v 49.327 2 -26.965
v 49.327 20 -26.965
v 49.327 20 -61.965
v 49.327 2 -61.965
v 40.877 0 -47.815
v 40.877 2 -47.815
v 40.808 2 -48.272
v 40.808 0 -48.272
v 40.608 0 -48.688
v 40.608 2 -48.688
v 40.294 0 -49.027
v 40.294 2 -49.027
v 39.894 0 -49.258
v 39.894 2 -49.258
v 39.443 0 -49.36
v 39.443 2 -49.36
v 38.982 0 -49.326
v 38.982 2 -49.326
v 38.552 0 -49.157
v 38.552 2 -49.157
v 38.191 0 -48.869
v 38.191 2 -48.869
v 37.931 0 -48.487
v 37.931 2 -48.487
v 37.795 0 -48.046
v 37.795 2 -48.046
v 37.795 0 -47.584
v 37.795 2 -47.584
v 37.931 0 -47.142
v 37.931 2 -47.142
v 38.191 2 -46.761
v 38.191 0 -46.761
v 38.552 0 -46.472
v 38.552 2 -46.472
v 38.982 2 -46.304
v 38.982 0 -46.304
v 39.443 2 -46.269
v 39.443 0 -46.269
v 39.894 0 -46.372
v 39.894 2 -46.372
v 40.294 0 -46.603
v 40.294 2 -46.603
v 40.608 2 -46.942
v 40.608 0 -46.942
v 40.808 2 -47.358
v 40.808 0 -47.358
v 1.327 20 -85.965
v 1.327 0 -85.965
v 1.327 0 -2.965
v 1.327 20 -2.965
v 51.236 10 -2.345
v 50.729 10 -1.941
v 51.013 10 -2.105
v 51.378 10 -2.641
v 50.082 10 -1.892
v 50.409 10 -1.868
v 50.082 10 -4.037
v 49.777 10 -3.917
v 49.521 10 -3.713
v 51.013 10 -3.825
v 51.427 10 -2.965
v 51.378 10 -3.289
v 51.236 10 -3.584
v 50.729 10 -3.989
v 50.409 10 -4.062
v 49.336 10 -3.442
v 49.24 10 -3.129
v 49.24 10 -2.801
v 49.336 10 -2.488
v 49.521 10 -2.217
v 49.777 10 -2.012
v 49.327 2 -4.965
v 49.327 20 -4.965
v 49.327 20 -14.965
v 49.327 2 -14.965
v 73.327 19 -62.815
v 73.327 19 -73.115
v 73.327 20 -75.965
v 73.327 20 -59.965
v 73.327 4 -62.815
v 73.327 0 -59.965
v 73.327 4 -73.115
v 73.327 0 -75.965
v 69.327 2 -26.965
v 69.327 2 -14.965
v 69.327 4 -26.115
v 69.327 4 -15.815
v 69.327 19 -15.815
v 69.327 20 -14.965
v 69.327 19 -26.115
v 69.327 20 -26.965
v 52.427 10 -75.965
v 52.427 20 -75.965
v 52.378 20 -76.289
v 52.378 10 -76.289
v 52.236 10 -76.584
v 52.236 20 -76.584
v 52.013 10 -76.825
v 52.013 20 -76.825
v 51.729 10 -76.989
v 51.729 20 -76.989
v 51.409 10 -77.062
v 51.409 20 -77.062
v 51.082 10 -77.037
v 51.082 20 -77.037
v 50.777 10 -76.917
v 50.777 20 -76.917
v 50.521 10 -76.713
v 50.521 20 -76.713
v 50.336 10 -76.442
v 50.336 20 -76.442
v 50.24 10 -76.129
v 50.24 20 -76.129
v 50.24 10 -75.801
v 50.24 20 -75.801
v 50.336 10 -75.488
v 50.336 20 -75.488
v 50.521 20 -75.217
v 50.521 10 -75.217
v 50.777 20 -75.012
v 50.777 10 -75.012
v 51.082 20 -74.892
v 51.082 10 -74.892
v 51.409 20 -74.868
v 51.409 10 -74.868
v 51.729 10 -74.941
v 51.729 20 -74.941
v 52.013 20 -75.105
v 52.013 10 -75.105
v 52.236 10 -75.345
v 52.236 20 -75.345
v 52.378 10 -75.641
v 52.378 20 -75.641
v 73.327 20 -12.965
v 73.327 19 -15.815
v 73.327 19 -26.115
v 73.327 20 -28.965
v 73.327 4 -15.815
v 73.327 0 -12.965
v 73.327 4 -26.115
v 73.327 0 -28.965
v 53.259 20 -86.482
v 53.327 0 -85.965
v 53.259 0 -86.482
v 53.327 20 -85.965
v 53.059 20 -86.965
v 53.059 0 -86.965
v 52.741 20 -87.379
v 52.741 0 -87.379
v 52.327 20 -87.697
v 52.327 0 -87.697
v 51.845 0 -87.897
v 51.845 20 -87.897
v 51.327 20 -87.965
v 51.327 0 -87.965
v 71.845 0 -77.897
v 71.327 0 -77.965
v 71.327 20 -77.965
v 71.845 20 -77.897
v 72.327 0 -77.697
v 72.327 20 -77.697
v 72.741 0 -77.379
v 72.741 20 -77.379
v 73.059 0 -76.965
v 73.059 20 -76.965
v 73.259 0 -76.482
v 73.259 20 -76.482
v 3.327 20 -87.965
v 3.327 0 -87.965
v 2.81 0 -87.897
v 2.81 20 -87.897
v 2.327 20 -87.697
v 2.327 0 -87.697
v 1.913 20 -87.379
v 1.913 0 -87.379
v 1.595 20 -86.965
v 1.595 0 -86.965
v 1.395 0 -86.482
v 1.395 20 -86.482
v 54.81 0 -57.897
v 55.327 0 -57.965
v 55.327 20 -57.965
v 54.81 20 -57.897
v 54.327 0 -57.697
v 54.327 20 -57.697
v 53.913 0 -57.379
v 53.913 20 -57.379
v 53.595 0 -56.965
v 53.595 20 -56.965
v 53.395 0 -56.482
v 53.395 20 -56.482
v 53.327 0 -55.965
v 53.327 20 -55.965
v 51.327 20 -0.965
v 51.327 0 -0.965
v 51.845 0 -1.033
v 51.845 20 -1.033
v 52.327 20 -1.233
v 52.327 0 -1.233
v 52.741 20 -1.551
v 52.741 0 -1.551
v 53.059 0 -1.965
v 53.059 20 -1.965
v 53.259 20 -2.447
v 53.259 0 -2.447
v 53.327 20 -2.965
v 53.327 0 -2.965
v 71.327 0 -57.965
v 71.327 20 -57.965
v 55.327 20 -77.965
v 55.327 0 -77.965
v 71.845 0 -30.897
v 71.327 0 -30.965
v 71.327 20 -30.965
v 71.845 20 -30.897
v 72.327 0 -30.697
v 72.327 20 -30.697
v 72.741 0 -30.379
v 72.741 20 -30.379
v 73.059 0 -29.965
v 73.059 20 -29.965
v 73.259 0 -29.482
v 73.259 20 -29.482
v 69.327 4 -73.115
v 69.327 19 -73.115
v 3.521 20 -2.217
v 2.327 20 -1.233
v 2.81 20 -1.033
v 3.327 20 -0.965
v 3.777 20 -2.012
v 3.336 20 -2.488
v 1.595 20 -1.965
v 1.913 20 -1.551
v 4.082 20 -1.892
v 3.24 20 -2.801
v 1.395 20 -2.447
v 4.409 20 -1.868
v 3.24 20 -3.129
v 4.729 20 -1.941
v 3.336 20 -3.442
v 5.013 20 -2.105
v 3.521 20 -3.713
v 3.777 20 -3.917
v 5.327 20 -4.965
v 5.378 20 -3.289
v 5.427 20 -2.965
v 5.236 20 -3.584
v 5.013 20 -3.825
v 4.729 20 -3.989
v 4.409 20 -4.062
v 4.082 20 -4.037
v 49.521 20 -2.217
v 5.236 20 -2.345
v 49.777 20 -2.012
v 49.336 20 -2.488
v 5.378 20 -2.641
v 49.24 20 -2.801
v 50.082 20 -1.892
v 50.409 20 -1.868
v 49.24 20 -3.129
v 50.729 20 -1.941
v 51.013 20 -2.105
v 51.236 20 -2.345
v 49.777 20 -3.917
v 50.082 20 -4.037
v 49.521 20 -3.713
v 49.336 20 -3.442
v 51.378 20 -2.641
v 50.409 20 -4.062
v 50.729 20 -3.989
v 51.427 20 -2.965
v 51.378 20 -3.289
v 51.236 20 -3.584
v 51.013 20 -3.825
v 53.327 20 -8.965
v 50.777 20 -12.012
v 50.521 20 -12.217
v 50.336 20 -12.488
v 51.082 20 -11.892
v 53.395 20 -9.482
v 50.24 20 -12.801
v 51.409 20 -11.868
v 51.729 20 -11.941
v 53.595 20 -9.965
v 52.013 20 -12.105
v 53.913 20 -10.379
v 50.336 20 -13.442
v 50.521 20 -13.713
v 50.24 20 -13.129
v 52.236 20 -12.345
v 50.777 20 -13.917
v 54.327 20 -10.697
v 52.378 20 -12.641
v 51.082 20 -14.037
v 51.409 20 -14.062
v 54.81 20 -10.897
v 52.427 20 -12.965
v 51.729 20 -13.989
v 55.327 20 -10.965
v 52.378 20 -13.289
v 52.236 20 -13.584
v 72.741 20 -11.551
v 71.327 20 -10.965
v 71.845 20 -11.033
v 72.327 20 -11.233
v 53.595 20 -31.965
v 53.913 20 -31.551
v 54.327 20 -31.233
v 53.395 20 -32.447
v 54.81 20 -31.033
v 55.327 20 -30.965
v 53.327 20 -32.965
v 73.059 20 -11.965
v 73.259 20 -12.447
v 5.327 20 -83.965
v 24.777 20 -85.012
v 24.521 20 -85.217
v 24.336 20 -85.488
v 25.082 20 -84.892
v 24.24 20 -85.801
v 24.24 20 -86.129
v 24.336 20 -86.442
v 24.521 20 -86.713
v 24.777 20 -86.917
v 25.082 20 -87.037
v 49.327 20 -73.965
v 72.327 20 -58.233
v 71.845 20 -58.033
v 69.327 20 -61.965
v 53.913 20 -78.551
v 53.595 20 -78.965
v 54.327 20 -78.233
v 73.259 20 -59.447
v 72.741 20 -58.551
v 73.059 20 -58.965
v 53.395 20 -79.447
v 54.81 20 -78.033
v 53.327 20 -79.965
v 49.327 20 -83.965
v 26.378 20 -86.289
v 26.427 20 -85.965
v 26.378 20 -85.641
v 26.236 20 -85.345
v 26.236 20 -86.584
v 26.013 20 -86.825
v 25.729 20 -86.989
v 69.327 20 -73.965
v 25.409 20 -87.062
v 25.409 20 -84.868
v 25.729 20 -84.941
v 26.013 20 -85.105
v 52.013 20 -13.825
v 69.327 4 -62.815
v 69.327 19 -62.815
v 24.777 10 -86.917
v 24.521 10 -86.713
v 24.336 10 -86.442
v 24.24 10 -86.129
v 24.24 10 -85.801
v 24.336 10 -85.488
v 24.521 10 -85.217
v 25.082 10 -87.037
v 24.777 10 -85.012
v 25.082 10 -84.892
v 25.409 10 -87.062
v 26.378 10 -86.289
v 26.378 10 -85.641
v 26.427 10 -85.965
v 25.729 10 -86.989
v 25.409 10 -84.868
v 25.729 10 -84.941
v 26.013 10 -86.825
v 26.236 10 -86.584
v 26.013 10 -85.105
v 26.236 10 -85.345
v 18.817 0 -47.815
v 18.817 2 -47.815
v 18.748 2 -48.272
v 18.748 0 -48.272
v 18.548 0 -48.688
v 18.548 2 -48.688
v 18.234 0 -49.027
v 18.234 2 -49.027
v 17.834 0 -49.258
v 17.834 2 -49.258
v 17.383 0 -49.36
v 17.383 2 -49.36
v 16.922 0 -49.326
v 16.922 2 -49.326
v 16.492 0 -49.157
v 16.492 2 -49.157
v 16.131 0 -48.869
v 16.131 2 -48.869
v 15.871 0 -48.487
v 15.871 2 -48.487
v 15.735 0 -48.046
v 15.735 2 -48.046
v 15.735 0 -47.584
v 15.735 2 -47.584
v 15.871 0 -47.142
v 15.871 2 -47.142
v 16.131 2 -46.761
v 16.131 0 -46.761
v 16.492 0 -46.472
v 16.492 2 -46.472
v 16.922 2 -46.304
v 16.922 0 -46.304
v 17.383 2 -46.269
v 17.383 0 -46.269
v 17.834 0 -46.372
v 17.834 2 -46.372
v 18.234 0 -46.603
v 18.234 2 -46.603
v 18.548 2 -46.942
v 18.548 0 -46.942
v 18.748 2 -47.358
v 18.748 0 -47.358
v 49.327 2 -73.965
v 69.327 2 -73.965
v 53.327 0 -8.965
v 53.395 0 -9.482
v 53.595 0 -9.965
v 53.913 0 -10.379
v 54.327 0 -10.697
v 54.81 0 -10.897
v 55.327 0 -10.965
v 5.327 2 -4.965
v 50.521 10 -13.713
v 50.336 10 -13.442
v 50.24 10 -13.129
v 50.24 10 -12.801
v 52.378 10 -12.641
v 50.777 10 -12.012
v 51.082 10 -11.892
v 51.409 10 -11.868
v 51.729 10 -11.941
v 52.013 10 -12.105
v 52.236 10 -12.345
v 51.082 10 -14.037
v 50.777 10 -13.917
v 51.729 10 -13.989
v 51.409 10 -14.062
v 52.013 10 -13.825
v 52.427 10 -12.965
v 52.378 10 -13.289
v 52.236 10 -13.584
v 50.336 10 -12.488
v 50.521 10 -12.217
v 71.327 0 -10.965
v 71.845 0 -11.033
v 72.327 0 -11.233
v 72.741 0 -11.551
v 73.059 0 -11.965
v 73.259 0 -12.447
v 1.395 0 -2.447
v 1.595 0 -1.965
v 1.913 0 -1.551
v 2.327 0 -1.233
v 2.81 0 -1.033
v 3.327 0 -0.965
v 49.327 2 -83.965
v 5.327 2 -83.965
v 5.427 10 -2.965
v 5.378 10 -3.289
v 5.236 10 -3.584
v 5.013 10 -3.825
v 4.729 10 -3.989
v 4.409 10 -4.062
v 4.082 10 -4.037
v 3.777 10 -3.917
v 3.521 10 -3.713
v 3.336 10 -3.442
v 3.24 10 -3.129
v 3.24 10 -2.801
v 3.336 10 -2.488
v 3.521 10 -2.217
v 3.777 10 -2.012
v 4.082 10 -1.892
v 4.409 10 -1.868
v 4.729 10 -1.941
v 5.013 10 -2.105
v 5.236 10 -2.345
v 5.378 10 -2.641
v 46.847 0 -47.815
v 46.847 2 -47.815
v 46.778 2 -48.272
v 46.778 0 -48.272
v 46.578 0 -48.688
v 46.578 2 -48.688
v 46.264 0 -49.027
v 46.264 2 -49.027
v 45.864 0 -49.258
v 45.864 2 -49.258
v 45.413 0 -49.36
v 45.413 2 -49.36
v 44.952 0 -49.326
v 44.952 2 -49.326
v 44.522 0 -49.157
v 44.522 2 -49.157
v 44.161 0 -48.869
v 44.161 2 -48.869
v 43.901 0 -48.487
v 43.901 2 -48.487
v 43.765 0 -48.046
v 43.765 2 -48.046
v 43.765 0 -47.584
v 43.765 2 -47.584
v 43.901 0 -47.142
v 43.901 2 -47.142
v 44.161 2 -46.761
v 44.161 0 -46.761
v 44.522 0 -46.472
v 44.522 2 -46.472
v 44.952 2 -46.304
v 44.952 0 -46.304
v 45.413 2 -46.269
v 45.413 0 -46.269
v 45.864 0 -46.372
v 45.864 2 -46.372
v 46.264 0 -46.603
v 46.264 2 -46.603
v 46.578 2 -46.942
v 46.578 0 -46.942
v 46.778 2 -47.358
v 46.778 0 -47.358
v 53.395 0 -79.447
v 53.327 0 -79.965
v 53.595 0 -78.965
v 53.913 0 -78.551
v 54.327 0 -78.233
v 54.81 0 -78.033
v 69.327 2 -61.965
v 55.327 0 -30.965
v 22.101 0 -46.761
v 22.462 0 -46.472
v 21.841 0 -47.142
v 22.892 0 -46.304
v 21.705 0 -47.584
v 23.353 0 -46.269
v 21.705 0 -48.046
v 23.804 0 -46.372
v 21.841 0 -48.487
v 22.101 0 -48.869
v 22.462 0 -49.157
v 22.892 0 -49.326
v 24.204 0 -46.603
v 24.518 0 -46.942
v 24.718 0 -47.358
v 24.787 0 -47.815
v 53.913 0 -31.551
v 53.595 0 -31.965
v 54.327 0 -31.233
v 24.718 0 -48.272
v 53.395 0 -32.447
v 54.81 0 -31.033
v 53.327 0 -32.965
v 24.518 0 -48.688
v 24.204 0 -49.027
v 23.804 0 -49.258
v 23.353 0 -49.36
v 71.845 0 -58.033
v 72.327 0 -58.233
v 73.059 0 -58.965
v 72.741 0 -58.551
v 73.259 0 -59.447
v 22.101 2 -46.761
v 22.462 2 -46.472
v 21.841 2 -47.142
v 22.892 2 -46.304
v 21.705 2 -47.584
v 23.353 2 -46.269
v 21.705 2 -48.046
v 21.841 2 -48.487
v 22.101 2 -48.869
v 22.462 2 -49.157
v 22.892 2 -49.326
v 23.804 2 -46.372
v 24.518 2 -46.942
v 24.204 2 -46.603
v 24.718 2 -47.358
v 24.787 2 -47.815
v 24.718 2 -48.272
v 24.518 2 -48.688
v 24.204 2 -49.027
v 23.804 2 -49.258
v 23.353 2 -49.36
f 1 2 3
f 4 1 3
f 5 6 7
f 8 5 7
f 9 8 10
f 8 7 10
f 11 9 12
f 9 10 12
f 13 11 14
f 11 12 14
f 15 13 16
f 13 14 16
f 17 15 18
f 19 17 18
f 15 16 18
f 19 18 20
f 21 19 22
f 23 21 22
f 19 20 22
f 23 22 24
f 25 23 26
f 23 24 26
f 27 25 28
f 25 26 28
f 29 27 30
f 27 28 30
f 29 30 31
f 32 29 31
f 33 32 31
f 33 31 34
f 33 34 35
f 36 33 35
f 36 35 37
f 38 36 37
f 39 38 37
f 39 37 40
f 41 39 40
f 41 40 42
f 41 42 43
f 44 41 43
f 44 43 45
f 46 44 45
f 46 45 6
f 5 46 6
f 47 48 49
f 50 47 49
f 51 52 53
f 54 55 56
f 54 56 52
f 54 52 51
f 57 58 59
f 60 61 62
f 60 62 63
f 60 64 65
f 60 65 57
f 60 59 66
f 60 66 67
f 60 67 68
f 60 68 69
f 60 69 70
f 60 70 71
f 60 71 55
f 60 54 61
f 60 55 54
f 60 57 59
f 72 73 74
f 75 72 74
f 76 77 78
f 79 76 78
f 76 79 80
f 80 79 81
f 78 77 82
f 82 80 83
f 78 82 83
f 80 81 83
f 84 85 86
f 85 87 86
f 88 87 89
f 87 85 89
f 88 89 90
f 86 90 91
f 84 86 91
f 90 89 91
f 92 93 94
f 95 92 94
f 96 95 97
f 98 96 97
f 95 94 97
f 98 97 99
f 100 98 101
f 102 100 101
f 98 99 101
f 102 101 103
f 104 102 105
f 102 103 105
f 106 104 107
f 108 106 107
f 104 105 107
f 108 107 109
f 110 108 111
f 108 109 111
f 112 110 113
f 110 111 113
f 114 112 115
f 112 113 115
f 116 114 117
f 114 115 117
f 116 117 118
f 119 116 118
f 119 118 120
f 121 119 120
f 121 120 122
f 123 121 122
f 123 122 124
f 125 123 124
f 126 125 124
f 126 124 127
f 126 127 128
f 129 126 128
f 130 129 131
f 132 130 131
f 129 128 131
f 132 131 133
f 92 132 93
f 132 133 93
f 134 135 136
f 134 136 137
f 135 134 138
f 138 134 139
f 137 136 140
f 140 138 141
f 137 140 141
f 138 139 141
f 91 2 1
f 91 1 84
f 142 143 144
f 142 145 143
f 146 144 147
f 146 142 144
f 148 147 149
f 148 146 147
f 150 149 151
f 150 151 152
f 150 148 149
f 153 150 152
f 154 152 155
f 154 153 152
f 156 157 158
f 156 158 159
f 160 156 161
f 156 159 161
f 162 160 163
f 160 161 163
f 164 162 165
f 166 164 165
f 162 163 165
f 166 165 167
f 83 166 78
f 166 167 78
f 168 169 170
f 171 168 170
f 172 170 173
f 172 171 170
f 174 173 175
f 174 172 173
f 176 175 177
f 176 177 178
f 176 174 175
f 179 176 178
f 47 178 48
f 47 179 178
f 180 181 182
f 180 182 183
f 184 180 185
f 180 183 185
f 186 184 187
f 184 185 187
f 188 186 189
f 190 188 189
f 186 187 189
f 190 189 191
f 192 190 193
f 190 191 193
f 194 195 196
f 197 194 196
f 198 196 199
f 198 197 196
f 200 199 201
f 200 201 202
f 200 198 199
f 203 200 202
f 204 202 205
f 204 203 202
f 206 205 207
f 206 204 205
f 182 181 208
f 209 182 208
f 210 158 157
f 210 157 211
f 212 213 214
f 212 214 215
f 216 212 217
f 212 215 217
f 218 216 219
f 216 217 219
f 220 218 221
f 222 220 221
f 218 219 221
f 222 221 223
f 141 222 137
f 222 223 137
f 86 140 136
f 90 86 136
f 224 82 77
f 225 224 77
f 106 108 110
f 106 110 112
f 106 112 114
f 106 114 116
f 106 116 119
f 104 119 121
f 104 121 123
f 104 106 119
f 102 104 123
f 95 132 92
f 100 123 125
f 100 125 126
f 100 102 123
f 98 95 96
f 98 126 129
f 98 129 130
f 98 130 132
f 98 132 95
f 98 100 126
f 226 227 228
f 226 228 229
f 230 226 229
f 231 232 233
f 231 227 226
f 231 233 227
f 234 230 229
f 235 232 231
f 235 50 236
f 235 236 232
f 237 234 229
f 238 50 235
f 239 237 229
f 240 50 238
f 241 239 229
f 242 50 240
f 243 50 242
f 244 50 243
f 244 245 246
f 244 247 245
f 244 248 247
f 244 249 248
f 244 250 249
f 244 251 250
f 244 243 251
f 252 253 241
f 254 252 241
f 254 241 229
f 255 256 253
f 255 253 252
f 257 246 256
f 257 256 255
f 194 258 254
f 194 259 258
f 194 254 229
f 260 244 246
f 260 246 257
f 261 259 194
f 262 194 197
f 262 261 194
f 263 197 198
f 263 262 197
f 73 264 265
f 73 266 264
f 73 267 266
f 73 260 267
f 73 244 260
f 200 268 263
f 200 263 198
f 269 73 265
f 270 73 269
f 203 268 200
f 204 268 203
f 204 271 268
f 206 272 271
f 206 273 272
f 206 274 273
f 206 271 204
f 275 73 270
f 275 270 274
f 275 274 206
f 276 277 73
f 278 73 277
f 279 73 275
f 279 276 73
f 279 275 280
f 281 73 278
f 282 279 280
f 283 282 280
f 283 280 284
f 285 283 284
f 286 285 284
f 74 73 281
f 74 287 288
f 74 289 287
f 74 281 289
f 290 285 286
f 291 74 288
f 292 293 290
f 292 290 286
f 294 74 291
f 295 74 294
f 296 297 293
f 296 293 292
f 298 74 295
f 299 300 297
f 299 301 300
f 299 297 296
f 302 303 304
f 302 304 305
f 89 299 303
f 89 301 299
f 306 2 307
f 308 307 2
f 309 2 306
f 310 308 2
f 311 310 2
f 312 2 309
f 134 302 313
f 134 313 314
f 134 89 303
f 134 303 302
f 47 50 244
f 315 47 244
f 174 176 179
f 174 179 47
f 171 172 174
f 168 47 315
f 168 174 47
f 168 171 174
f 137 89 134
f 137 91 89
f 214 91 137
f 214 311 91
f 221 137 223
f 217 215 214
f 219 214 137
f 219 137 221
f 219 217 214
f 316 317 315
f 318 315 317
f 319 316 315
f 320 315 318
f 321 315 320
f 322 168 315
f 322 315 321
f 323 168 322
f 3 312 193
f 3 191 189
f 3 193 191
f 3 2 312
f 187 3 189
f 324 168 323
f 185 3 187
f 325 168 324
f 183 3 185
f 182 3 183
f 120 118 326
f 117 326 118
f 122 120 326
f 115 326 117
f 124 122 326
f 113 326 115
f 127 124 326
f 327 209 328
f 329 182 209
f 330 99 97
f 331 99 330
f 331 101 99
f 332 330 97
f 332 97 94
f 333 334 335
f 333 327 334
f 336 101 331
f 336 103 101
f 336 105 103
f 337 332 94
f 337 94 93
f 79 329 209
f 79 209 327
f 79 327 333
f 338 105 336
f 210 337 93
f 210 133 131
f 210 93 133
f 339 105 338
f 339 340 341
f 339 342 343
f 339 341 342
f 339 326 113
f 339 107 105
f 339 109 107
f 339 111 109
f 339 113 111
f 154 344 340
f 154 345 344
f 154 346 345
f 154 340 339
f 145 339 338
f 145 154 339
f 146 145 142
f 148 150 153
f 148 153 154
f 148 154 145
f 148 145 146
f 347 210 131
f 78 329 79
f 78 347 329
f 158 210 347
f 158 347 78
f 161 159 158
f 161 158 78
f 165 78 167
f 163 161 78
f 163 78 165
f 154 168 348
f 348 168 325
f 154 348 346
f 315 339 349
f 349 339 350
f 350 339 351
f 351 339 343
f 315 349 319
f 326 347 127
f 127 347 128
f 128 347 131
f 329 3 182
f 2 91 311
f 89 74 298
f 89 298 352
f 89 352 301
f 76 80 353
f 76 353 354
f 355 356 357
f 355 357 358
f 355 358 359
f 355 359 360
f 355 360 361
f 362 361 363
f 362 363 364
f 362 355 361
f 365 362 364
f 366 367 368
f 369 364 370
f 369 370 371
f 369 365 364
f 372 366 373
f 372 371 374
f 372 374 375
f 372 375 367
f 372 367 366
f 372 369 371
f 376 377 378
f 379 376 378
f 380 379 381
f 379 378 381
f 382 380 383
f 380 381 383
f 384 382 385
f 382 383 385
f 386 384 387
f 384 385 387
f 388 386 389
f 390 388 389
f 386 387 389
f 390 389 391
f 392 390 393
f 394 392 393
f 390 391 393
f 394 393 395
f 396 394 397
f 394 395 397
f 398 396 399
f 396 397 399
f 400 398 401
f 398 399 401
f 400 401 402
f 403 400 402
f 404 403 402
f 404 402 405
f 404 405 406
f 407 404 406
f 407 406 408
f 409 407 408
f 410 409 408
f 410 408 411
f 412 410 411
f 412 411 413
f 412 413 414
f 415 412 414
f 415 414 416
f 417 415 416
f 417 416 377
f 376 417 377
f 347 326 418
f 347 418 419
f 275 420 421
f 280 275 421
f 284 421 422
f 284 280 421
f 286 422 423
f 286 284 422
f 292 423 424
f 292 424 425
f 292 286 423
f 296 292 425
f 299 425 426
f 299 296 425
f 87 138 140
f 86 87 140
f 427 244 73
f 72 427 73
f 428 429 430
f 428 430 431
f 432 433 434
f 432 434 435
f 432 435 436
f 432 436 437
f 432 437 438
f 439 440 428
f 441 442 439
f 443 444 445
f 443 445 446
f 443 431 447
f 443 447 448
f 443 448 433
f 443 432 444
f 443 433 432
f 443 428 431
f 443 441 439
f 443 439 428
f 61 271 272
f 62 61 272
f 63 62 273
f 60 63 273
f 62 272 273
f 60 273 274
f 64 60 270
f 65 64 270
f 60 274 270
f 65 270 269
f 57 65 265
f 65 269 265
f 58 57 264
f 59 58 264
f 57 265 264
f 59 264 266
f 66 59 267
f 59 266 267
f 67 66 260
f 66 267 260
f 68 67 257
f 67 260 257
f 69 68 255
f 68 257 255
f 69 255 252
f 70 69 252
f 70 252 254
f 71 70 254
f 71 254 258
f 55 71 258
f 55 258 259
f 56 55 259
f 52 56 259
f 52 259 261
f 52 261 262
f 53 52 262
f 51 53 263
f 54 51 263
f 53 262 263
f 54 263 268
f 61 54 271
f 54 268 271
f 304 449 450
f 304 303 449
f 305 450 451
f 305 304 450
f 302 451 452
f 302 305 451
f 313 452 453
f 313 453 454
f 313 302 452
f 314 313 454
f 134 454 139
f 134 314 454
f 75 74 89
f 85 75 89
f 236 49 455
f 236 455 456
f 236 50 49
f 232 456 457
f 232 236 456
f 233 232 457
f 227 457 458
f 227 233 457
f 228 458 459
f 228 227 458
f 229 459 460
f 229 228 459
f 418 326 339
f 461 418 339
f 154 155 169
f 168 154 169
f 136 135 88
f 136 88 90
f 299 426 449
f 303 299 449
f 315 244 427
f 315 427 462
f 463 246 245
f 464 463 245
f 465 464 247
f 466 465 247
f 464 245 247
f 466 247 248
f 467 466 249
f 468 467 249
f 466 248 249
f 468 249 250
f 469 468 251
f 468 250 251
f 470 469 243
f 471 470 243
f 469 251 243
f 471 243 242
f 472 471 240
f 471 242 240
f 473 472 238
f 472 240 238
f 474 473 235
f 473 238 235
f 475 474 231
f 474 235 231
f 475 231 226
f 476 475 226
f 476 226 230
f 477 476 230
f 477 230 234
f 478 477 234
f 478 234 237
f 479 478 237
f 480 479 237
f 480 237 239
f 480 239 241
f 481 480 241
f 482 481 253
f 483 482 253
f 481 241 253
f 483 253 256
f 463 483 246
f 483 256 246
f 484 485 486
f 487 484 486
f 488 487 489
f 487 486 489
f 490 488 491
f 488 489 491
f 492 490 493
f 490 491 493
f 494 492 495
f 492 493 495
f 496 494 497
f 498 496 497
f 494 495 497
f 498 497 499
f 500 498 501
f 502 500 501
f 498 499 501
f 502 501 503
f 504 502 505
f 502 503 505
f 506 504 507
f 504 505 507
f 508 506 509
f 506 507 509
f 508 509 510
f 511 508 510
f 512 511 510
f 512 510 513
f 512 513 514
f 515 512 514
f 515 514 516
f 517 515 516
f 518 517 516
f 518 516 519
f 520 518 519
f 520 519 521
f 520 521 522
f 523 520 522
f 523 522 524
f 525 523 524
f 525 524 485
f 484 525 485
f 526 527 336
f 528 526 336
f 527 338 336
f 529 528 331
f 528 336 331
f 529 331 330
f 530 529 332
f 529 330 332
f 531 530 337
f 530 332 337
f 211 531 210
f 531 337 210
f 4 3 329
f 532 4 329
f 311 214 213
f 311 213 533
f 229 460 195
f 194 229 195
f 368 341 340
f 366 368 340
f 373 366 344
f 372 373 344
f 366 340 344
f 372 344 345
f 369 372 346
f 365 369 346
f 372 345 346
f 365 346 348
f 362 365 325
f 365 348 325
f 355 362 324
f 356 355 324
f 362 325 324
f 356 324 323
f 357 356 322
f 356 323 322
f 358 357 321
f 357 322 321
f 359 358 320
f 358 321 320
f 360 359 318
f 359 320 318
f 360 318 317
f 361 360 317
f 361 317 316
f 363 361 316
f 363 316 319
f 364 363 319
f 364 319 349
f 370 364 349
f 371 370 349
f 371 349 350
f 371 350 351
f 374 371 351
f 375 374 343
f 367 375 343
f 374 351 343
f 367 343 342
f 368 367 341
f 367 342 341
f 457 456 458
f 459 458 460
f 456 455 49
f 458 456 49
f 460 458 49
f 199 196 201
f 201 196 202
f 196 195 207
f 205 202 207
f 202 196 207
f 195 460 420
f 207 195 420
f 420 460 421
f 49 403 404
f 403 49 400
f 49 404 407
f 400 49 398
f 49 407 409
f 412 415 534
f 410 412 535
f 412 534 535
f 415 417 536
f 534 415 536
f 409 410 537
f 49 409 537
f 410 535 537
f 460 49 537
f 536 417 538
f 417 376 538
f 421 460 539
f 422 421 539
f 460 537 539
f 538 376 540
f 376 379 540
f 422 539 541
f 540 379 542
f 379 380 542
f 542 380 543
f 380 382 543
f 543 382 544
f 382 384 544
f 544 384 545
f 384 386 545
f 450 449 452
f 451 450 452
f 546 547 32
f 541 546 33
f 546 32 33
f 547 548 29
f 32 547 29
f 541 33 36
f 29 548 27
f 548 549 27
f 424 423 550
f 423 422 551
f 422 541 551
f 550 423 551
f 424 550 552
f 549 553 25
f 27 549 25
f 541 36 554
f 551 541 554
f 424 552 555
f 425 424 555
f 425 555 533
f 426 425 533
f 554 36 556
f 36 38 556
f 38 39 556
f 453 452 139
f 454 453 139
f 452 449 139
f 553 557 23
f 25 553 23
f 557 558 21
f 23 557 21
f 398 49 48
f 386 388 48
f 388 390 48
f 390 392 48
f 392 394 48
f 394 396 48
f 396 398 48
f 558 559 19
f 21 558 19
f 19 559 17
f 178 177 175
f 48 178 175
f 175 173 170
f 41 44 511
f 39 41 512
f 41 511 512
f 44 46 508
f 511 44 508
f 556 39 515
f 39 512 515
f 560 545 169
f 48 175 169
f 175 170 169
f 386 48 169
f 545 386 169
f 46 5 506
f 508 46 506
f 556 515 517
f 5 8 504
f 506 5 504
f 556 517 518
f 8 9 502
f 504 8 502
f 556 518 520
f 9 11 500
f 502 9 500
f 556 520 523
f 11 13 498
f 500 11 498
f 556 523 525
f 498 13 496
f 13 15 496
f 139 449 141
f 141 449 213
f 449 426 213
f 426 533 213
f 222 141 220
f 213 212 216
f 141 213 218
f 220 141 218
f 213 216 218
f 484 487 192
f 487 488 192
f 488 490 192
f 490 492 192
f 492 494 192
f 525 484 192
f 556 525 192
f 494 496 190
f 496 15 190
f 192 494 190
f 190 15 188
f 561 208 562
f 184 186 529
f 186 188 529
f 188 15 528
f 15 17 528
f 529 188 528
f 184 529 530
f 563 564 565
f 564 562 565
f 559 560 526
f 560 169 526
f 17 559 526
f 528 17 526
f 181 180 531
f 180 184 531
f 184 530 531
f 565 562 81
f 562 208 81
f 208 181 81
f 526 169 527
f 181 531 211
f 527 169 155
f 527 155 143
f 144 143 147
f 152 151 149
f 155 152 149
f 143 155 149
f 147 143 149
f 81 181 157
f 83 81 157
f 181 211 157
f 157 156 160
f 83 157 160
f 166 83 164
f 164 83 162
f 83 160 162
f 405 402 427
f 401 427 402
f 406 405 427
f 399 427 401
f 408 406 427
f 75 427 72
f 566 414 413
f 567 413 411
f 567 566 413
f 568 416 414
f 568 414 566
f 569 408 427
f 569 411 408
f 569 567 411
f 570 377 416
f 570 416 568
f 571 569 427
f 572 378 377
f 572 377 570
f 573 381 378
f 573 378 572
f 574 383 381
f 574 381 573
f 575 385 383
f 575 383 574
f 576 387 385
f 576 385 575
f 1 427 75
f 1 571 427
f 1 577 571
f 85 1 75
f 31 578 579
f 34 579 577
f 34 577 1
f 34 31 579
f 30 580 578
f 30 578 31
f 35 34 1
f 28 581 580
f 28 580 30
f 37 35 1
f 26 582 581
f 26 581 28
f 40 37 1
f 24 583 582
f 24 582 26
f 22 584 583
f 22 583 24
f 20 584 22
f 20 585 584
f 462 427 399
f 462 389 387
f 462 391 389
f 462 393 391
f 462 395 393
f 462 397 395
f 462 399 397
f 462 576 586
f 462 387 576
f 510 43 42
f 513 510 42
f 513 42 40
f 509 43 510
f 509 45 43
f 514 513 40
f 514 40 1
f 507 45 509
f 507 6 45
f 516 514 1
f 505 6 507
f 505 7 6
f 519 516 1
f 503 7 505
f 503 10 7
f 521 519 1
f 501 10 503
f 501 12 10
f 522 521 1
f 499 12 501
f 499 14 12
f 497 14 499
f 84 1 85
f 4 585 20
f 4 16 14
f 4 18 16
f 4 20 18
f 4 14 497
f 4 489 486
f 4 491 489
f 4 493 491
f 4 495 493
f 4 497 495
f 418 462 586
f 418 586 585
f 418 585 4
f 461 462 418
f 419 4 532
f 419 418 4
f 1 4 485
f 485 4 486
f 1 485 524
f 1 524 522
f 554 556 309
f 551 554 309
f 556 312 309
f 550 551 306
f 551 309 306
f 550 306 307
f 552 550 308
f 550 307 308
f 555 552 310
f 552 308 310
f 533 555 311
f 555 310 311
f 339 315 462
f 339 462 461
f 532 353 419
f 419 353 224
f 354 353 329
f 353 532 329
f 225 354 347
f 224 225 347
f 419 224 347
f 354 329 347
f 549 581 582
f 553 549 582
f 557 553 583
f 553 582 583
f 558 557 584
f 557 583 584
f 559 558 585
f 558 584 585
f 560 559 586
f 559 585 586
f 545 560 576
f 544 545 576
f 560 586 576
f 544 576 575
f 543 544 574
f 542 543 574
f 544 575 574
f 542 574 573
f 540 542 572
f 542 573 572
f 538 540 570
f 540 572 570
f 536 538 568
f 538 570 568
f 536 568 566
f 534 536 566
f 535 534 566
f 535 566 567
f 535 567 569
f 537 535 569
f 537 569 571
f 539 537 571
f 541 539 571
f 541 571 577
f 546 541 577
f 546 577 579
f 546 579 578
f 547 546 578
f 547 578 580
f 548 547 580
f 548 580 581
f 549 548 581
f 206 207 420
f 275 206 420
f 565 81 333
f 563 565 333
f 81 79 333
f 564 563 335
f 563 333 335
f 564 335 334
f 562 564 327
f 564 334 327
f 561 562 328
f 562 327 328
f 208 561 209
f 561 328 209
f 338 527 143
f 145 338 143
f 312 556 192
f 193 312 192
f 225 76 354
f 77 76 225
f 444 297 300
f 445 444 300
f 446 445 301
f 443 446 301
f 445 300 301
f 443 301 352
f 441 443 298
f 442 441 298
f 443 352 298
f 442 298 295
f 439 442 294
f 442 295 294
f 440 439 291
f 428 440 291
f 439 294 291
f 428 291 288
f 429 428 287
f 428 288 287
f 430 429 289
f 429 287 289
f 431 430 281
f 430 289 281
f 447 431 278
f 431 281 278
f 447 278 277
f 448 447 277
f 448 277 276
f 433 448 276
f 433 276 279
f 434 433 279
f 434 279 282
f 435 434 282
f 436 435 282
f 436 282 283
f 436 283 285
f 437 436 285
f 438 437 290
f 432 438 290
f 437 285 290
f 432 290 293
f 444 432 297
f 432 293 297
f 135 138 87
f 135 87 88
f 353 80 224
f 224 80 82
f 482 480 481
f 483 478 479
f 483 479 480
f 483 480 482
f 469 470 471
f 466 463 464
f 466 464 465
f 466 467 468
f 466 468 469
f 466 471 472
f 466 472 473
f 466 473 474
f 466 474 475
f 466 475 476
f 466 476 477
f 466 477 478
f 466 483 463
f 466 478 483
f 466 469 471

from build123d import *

# Parameters (mm, degrees)
BOSS_EXTRUDE1_DEPTH = 20
SKETCH2_W           = 44
SKETCH2_H           = 79
CUT_EXTRUDE1_DEPTH  = 18
SKETCH3_W           = 20
SKETCH3_H           = 12
CUT_EXTRUDE2_DEPTH  = 18
SKETCH4_R           = 1.1
CUT_EXTRUDE3_DEPTH  = 10
SKETCH5_R           = 1.1
CUT_EXTRUDE4_DEPTH  = 10
SKETCH6_W           = 10.3
SKETCH6_H           = 15
CUT_EXTRUDE5_DEPTH  = 6
SKETCH7_R           = 1.55
CUT_EXTRUDE6_DEPTH  = 6
FILLET1_R           = 2


with BuildPart() as part:
    # Sketch1 → Boss-Extrude1 (new body)
    with BuildSketch(Plane(origin=(0, 0, 0), x_dir=(1, 0, 0), z_dir=(0, 1, 0))):
        Polygon((53.327223789, 77.96478334), (53.327223789, 87.96478334), (1.327223789, 87.96478334), (1.327223789, 0.96478334), (53.327223789, 0.96478334), (53.327223789, 10.96478334), (73.327223789, 10.96478334), (73.327223789, 30.96478334), (53.327223789, 30.96478334), (53.327223789, 57.96478334), (73.327223789, 57.96478334), (73.327223789, 77.96478334), align=None)
    extrude(amount=BOSS_EXTRUDE1_DEPTH)

    # Sketch2 → Cut-Extrude1 (cut)
    with BuildSketch(Plane(origin=(0, 20, 0), x_dir=(1, 0, 0), z_dir=(0, 1, 0))):
        with Locations((27.327223789, 44.46478334)):
            Rectangle(SKETCH2_W, SKETCH2_H)
    extrude(amount=-CUT_EXTRUDE1_DEPTH, mode=Mode.SUBTRACT)

    # Sketch3 → Cut-Extrude2 (cut)
    with BuildSketch(Plane(origin=(0, 20, 0), x_dir=(1, 0, 0), z_dir=(0, 1, 0))):
        with Locations((59.327223789, 67.96478334)):
            Rectangle(SKETCH3_W, SKETCH3_H)
        with Locations((59.327223789, 20.96478334)):
            Rectangle(SKETCH3_W, SKETCH3_H)
    extrude(amount=-CUT_EXTRUDE2_DEPTH, mode=Mode.SUBTRACT)

    # Sketch4 → Cut-Extrude3 (cut)
    with BuildSketch(Plane(origin=(0, 20, 0), x_dir=(1, 0, 0), z_dir=(0, 1, 0))):
        with Locations((4.327223789, 2.96478334)):
            Circle(SKETCH4_R)
        with Locations((50.327223789, 2.96478334)):
            Circle(SKETCH4_R)
        with Locations((25.327223789, 85.96478334)):
            Circle(SKETCH4_R)
    extrude(amount=-CUT_EXTRUDE3_DEPTH, mode=Mode.SUBTRACT)

    # Sketch5 → Cut-Extrude4 (cut)
    with BuildSketch(Plane(origin=(0, 20, 0), x_dir=(1, 0, 0), z_dir=(0, 1, 0))):
        with Locations((51.327223789, 12.96478334)):
            Circle(SKETCH5_R)
        with Locations((51.327223789, 75.96478334)):
            Circle(SKETCH5_R)
    extrude(amount=-CUT_EXTRUDE4_DEPTH, mode=Mode.SUBTRACT)

    # Sketch6 → Cut-Extrude5 (cut)
    with BuildSketch(Plane(origin=(73.327223789, 0, 0), x_dir=(0, 0, -1), z_dir=(1, 0, 0))):
        with Locations((67.96478334, 11.5)):
            Rectangle(SKETCH6_W, SKETCH6_H)
        with Locations((20.96478334, 11.5)):
            Rectangle(SKETCH6_W, SKETCH6_H)
    extrude(amount=-CUT_EXTRUDE5_DEPTH, mode=Mode.SUBTRACT)

    # Sketch7 → Cut-Extrude6 (cut)
    with BuildSketch(Plane(origin=(0, 2, 0), x_dir=(1, 0, 0), z_dir=(0, 1, 0))):
        with Locations((45.297223789, 47.81478334)):
            Circle(SKETCH7_R)
        with Locations((23.237223789, 47.81478334)):
            Circle(SKETCH7_R)
        with Locations((39.327223789, 47.81478334)):
            Circle(SKETCH7_R)
        with Locations((17.267223789, 47.81478334)):
            Circle(SKETCH7_R)
    extrude(amount=-CUT_EXTRUDE6_DEPTH, mode=Mode.SUBTRACT)

    # Fillet1
    fillet1_edges = [part.edges().sort_by_distance(p)[0] for p in [
        (1.327223789, 10, -87.96478334),
        (53.327223789, 10, -87.96478334),
        (53.327223789, 10, -77.96478334),
        (73.327223789, 10, -77.96478334),
        (73.327223789, 10, -57.96478334),
        (53.327223789, 10, -57.96478334),
        (53.327223789, 10, -30.96478334),
        (73.327223789, 10, -30.96478334),
        (73.327223789, 10, -10.96478334),
        (53.327223789, 10, -10.96478334),
        (53.327223789, 10, -0.96478334),
        (1.327223789, 10, -0.96478334),
    ]]
    fillet(fillet1_edges, radius=FILLET1_R)


solid = part.part
